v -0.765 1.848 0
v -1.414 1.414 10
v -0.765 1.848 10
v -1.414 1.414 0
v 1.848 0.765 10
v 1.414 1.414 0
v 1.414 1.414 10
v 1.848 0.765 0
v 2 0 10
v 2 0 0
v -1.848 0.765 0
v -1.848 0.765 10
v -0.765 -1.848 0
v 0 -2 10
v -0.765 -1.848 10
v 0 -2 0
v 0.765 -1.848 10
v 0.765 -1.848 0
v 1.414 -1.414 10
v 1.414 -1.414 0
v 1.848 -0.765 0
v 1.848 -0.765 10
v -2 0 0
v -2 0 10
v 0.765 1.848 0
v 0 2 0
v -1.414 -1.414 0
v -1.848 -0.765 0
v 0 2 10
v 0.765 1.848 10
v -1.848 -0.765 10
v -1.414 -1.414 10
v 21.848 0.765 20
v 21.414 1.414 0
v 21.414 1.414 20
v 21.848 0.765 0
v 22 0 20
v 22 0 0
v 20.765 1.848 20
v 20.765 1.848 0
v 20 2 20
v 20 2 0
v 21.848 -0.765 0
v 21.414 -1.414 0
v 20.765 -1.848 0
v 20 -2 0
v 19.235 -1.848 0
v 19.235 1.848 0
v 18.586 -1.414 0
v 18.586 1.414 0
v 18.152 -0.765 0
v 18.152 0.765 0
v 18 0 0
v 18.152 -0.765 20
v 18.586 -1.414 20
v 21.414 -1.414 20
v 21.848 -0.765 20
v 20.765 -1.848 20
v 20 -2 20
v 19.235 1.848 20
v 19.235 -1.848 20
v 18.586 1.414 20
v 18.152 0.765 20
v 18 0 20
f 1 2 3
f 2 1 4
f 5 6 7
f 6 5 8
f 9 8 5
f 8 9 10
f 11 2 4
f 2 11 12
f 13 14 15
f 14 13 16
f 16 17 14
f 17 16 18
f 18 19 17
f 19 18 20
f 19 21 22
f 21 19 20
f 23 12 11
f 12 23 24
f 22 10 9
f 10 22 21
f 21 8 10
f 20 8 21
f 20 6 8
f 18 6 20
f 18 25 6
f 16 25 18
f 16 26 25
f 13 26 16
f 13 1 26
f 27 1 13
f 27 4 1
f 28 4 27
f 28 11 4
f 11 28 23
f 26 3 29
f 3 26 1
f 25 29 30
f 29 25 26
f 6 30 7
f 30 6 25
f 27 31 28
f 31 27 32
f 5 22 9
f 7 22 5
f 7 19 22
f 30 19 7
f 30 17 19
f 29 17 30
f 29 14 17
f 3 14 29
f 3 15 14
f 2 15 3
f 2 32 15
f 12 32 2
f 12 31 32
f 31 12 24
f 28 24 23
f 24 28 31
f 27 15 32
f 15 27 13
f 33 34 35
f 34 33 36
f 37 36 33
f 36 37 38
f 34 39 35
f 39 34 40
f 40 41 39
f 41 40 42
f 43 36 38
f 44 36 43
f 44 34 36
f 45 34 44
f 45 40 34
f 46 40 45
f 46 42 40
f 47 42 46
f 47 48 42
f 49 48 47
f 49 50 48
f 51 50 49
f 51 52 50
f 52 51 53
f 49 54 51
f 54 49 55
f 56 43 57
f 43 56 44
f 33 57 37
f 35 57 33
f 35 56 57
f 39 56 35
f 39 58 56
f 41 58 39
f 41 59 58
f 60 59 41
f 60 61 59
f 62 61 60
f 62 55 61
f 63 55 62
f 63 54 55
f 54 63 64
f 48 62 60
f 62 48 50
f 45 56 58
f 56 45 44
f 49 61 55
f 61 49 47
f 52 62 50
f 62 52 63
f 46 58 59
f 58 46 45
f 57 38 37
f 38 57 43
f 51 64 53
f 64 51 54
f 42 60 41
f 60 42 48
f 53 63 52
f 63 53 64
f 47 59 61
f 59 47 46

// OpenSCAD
module post(h = 10, d = 4) {
  cylinder(h = h, d = d, $fn = 16);
}
union() {
  post();
  translate([20, 0, 0]) post(h = 20);
}
